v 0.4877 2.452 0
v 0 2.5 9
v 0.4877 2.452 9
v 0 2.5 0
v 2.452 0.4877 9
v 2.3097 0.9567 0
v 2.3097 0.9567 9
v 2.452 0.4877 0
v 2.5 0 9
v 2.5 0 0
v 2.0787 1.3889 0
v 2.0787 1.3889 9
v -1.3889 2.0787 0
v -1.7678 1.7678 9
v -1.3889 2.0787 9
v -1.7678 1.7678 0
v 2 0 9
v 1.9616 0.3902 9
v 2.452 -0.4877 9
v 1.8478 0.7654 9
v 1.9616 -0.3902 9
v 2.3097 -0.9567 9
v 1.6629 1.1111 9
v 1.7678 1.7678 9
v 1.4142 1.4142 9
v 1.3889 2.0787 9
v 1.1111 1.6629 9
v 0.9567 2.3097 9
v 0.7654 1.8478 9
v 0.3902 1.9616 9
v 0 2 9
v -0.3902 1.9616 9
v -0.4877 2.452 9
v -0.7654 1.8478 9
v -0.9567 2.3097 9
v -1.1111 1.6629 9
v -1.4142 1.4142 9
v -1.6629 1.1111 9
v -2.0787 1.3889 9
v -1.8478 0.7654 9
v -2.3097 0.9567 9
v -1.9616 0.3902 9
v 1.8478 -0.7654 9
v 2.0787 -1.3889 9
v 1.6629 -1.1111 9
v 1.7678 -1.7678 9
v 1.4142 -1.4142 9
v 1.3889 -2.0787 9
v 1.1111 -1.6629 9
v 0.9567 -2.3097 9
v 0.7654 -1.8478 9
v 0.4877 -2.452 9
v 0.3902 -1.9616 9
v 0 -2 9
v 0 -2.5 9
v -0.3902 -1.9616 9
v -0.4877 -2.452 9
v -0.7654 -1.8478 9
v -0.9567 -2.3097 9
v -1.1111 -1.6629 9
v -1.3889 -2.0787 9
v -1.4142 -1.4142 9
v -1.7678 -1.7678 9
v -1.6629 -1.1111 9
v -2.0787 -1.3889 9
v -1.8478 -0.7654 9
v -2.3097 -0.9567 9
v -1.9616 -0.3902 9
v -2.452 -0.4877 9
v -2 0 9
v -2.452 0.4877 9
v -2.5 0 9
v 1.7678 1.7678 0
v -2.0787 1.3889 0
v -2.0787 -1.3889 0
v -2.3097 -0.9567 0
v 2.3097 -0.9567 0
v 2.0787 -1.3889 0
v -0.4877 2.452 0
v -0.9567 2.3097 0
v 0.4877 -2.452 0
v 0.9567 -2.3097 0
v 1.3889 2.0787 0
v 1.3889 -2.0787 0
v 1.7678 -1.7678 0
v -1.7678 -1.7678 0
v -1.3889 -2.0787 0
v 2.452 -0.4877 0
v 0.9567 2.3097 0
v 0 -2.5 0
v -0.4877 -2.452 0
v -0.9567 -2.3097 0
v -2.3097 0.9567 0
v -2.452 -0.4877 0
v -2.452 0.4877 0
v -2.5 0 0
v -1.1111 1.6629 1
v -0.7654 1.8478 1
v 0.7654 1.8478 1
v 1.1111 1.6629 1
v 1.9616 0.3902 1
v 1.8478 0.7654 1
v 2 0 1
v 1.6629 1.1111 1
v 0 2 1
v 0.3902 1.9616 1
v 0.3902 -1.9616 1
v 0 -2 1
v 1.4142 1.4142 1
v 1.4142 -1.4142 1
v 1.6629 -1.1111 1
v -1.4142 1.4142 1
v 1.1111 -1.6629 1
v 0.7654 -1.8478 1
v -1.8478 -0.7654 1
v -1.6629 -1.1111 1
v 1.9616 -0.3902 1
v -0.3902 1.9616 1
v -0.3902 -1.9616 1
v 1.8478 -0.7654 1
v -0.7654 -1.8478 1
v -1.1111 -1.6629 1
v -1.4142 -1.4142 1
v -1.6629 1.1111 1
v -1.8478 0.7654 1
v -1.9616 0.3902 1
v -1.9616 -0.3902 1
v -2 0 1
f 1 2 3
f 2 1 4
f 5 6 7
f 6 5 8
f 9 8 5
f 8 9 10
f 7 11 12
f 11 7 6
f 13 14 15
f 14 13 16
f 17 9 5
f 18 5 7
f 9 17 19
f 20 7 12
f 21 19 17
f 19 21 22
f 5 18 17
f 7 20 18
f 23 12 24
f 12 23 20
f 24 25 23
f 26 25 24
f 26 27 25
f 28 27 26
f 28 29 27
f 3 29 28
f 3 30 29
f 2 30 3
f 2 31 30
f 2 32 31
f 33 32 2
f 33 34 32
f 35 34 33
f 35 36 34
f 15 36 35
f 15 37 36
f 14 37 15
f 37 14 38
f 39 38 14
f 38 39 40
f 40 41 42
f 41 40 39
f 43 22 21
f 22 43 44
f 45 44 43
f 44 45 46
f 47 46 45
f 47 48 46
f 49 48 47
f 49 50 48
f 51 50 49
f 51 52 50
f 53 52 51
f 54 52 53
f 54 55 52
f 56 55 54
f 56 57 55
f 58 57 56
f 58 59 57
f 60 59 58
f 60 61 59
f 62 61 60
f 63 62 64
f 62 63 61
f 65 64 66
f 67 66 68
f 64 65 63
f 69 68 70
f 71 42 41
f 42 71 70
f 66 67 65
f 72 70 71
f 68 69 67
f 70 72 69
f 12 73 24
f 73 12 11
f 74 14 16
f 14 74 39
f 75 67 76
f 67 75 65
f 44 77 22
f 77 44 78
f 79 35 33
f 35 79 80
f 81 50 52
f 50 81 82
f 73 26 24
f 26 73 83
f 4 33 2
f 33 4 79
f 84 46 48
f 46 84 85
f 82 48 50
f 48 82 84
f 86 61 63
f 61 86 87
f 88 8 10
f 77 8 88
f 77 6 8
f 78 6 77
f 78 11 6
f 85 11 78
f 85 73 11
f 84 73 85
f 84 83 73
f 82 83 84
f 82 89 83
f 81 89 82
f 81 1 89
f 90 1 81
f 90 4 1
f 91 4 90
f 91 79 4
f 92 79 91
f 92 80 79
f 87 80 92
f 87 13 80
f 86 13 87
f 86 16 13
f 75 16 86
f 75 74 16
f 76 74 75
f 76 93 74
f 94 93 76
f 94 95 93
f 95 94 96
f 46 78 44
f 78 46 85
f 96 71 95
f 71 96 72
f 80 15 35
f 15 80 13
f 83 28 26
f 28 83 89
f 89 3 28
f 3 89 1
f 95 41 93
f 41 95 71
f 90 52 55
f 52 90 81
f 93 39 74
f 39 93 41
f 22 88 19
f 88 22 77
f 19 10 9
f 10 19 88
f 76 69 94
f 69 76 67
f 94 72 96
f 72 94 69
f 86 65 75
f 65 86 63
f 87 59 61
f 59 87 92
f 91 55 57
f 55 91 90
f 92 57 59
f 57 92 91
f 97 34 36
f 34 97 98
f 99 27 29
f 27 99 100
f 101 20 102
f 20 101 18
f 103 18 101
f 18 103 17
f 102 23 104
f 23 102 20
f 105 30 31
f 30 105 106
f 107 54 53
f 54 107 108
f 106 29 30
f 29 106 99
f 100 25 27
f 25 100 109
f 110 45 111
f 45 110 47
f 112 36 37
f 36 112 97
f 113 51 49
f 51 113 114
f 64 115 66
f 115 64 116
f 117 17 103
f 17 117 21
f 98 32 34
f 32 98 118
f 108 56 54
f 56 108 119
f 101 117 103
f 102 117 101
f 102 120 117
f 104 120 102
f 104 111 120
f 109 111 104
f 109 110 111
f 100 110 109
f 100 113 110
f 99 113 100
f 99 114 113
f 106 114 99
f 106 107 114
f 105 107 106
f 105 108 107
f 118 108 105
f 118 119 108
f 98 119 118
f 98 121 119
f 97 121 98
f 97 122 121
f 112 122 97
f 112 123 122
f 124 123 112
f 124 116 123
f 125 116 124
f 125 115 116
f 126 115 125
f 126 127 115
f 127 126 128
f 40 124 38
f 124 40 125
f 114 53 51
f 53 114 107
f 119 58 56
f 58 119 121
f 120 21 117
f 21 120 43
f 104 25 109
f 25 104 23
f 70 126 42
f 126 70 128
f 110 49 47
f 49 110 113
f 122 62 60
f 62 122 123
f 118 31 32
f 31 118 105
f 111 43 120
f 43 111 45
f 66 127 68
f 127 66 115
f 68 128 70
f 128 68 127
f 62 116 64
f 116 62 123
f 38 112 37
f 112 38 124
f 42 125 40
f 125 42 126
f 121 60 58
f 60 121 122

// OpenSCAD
echo(version=version());

// simple cut out cylinder
innerDiameter = 4;
outerDiameter = 5;
innerHeight = 8;
outerHeight = 9;

difference() {
cylinder(d=outerDiameter,h=outerHeight, $fn=32);
    CutOut(innerDiameter, innerHeight);
}

module CutOut(innerDiameter, innerHeight) {
    translate([0, 0, outerHeight-innerHeight])
    cylinder(d=innerDiameter, h=outerHeight, $fn=32);
}
